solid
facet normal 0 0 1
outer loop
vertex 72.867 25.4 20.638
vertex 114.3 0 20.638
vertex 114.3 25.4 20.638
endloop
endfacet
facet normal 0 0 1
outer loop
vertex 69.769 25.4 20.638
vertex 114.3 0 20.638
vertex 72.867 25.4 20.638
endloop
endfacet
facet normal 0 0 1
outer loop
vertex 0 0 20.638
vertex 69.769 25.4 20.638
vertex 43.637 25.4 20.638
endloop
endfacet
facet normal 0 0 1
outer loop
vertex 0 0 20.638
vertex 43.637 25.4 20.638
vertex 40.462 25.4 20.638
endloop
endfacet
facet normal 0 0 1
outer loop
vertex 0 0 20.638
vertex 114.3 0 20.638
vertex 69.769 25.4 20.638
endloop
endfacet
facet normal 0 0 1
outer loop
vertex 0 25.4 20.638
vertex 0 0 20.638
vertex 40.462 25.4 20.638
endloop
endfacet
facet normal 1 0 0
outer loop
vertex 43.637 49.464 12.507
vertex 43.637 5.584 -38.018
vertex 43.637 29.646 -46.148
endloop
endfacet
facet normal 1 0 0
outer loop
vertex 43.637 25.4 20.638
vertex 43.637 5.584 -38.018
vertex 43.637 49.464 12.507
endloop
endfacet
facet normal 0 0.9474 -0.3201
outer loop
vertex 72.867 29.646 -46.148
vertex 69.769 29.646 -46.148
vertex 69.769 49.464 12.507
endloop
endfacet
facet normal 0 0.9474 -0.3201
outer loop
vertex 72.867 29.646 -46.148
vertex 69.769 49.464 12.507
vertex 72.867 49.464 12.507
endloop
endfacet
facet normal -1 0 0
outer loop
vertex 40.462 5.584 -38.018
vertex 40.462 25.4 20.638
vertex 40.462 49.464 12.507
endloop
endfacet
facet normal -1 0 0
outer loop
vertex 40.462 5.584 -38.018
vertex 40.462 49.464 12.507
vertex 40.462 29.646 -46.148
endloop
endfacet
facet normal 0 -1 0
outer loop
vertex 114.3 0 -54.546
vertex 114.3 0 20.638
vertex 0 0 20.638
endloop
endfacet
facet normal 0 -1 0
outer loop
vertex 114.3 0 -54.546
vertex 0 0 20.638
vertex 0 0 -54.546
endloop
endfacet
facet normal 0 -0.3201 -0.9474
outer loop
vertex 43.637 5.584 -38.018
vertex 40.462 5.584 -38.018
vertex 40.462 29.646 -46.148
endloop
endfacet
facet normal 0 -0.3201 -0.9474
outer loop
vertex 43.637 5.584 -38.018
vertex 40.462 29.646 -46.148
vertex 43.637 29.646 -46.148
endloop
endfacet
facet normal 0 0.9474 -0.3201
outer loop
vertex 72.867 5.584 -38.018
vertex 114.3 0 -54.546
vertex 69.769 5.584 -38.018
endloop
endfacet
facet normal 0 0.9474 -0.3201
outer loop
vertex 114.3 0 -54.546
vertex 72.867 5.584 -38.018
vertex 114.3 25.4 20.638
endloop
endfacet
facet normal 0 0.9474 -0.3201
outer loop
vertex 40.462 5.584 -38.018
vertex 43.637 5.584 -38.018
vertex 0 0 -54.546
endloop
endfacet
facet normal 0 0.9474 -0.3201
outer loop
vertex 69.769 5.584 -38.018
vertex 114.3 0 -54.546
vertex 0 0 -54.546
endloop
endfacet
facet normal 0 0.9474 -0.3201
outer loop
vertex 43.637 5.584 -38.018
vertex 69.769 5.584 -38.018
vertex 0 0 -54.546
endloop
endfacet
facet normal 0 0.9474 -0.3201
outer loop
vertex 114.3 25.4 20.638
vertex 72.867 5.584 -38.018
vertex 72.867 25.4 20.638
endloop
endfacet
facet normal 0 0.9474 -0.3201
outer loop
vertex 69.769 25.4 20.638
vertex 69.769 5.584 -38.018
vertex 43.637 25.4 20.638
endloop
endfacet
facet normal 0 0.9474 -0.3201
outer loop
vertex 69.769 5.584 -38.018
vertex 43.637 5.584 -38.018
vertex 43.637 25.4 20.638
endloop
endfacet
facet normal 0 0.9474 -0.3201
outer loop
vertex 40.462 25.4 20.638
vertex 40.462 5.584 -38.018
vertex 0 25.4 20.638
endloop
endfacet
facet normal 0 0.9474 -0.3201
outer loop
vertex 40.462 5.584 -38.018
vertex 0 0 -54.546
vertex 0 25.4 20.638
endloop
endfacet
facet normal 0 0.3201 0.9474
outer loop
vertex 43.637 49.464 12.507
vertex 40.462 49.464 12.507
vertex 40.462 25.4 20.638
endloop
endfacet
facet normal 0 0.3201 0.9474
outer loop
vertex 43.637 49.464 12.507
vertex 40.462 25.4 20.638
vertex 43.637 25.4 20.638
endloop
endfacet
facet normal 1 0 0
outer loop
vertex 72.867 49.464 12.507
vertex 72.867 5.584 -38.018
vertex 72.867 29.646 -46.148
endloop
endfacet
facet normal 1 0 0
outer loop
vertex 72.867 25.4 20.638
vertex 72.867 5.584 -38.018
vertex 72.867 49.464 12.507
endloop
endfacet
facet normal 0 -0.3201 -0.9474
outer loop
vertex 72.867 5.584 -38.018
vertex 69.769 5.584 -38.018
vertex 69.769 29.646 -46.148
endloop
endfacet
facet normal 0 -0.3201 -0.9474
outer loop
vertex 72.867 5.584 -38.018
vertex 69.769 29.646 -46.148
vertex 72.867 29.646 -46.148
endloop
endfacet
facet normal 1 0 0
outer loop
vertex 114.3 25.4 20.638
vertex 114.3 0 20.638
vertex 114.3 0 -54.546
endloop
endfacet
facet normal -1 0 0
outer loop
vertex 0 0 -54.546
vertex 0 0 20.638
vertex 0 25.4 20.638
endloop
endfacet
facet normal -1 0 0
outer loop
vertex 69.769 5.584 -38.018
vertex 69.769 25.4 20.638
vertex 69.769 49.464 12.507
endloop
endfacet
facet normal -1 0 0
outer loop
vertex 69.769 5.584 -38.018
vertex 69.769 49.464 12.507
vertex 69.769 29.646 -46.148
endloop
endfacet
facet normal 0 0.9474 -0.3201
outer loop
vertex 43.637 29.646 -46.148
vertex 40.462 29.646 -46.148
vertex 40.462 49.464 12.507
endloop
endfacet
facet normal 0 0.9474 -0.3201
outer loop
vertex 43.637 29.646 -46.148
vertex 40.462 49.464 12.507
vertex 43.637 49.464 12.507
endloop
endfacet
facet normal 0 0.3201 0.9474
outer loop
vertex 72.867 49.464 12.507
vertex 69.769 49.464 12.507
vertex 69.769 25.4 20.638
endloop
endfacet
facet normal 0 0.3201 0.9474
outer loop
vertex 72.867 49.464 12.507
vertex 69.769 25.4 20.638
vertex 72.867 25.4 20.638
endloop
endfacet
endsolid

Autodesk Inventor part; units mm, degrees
ref_plane "YZ Plane" through (0, 0, 0) normal (1, 0, 0) x (0, 1, 0)
ref_plane "XZ Plane" through (0, 0, 0) normal (0, 1, 0) x (-1, 0, 0)
ref_plane "XY Plane" through (0, 0, 0) normal (0, 0, 1) x (1, 0, 0)
sketch "Sketch1" plane through (0, 0, 0) normal (1, 0, 0) x (0, 1, 0)
  line L0 (0, 20.6375) -> (25.4, 20.6375)
  line L1 (0, 20.6375) -> (0, -54.5465)
  line L2 (0, -54.5465) -> (25.4, 20.6375)
  point P0 (0, 0)
  dimension "d0" = 25.4
  dimension "d1" = 75.184
extrude "Extrusion1" add sketch "Sketch1" along normal blind 114.3
sketch "Sketch2" plane through (0, 25.4, 20.6375) normal (0, 0.9474, -0.3201) x (1, 0, 0)
  line L0 (0, 79.3586) -> (0, 0) projected
  line L1 (0, 0) -> (114.3, 0) projected
  line L2 (114.3, 79.3586) -> (114.3, 0) projected
  line L3 (0, 79.3586) -> (114.3, 79.3586) projected
  line L4 (0, 0) -> (114.3, 0) projected
  line L5 (72.8666, 0) -> (69.7688, 0)
  line L6 (69.7688, 0) -> (69.7688, 61.9125)
  line L7 (69.7688, 61.9125) -> (72.8666, 61.9125)
  line L8 (72.8666, 61.9125) -> (72.8666, 0)
  line L9 (43.6373, 0) -> (40.4623, 0)
  line L10 (40.4623, 0) -> (40.4623, 61.9125)
  line L11 (40.4623, 61.9125) -> (43.6373, 61.9125)
  line L12 (43.6373, 61.9125) -> (43.6373, 0)
  point P0 (0, 27.6815)
  dimension "d4" = 3.175
extrude "Extrusion2" add sketch "Sketch2" along normal blind 25.4 contours L10 L11 L12 L1 | L1 L6 L7 L8
properties part number "WOODEN CORRECT SLIDER"
